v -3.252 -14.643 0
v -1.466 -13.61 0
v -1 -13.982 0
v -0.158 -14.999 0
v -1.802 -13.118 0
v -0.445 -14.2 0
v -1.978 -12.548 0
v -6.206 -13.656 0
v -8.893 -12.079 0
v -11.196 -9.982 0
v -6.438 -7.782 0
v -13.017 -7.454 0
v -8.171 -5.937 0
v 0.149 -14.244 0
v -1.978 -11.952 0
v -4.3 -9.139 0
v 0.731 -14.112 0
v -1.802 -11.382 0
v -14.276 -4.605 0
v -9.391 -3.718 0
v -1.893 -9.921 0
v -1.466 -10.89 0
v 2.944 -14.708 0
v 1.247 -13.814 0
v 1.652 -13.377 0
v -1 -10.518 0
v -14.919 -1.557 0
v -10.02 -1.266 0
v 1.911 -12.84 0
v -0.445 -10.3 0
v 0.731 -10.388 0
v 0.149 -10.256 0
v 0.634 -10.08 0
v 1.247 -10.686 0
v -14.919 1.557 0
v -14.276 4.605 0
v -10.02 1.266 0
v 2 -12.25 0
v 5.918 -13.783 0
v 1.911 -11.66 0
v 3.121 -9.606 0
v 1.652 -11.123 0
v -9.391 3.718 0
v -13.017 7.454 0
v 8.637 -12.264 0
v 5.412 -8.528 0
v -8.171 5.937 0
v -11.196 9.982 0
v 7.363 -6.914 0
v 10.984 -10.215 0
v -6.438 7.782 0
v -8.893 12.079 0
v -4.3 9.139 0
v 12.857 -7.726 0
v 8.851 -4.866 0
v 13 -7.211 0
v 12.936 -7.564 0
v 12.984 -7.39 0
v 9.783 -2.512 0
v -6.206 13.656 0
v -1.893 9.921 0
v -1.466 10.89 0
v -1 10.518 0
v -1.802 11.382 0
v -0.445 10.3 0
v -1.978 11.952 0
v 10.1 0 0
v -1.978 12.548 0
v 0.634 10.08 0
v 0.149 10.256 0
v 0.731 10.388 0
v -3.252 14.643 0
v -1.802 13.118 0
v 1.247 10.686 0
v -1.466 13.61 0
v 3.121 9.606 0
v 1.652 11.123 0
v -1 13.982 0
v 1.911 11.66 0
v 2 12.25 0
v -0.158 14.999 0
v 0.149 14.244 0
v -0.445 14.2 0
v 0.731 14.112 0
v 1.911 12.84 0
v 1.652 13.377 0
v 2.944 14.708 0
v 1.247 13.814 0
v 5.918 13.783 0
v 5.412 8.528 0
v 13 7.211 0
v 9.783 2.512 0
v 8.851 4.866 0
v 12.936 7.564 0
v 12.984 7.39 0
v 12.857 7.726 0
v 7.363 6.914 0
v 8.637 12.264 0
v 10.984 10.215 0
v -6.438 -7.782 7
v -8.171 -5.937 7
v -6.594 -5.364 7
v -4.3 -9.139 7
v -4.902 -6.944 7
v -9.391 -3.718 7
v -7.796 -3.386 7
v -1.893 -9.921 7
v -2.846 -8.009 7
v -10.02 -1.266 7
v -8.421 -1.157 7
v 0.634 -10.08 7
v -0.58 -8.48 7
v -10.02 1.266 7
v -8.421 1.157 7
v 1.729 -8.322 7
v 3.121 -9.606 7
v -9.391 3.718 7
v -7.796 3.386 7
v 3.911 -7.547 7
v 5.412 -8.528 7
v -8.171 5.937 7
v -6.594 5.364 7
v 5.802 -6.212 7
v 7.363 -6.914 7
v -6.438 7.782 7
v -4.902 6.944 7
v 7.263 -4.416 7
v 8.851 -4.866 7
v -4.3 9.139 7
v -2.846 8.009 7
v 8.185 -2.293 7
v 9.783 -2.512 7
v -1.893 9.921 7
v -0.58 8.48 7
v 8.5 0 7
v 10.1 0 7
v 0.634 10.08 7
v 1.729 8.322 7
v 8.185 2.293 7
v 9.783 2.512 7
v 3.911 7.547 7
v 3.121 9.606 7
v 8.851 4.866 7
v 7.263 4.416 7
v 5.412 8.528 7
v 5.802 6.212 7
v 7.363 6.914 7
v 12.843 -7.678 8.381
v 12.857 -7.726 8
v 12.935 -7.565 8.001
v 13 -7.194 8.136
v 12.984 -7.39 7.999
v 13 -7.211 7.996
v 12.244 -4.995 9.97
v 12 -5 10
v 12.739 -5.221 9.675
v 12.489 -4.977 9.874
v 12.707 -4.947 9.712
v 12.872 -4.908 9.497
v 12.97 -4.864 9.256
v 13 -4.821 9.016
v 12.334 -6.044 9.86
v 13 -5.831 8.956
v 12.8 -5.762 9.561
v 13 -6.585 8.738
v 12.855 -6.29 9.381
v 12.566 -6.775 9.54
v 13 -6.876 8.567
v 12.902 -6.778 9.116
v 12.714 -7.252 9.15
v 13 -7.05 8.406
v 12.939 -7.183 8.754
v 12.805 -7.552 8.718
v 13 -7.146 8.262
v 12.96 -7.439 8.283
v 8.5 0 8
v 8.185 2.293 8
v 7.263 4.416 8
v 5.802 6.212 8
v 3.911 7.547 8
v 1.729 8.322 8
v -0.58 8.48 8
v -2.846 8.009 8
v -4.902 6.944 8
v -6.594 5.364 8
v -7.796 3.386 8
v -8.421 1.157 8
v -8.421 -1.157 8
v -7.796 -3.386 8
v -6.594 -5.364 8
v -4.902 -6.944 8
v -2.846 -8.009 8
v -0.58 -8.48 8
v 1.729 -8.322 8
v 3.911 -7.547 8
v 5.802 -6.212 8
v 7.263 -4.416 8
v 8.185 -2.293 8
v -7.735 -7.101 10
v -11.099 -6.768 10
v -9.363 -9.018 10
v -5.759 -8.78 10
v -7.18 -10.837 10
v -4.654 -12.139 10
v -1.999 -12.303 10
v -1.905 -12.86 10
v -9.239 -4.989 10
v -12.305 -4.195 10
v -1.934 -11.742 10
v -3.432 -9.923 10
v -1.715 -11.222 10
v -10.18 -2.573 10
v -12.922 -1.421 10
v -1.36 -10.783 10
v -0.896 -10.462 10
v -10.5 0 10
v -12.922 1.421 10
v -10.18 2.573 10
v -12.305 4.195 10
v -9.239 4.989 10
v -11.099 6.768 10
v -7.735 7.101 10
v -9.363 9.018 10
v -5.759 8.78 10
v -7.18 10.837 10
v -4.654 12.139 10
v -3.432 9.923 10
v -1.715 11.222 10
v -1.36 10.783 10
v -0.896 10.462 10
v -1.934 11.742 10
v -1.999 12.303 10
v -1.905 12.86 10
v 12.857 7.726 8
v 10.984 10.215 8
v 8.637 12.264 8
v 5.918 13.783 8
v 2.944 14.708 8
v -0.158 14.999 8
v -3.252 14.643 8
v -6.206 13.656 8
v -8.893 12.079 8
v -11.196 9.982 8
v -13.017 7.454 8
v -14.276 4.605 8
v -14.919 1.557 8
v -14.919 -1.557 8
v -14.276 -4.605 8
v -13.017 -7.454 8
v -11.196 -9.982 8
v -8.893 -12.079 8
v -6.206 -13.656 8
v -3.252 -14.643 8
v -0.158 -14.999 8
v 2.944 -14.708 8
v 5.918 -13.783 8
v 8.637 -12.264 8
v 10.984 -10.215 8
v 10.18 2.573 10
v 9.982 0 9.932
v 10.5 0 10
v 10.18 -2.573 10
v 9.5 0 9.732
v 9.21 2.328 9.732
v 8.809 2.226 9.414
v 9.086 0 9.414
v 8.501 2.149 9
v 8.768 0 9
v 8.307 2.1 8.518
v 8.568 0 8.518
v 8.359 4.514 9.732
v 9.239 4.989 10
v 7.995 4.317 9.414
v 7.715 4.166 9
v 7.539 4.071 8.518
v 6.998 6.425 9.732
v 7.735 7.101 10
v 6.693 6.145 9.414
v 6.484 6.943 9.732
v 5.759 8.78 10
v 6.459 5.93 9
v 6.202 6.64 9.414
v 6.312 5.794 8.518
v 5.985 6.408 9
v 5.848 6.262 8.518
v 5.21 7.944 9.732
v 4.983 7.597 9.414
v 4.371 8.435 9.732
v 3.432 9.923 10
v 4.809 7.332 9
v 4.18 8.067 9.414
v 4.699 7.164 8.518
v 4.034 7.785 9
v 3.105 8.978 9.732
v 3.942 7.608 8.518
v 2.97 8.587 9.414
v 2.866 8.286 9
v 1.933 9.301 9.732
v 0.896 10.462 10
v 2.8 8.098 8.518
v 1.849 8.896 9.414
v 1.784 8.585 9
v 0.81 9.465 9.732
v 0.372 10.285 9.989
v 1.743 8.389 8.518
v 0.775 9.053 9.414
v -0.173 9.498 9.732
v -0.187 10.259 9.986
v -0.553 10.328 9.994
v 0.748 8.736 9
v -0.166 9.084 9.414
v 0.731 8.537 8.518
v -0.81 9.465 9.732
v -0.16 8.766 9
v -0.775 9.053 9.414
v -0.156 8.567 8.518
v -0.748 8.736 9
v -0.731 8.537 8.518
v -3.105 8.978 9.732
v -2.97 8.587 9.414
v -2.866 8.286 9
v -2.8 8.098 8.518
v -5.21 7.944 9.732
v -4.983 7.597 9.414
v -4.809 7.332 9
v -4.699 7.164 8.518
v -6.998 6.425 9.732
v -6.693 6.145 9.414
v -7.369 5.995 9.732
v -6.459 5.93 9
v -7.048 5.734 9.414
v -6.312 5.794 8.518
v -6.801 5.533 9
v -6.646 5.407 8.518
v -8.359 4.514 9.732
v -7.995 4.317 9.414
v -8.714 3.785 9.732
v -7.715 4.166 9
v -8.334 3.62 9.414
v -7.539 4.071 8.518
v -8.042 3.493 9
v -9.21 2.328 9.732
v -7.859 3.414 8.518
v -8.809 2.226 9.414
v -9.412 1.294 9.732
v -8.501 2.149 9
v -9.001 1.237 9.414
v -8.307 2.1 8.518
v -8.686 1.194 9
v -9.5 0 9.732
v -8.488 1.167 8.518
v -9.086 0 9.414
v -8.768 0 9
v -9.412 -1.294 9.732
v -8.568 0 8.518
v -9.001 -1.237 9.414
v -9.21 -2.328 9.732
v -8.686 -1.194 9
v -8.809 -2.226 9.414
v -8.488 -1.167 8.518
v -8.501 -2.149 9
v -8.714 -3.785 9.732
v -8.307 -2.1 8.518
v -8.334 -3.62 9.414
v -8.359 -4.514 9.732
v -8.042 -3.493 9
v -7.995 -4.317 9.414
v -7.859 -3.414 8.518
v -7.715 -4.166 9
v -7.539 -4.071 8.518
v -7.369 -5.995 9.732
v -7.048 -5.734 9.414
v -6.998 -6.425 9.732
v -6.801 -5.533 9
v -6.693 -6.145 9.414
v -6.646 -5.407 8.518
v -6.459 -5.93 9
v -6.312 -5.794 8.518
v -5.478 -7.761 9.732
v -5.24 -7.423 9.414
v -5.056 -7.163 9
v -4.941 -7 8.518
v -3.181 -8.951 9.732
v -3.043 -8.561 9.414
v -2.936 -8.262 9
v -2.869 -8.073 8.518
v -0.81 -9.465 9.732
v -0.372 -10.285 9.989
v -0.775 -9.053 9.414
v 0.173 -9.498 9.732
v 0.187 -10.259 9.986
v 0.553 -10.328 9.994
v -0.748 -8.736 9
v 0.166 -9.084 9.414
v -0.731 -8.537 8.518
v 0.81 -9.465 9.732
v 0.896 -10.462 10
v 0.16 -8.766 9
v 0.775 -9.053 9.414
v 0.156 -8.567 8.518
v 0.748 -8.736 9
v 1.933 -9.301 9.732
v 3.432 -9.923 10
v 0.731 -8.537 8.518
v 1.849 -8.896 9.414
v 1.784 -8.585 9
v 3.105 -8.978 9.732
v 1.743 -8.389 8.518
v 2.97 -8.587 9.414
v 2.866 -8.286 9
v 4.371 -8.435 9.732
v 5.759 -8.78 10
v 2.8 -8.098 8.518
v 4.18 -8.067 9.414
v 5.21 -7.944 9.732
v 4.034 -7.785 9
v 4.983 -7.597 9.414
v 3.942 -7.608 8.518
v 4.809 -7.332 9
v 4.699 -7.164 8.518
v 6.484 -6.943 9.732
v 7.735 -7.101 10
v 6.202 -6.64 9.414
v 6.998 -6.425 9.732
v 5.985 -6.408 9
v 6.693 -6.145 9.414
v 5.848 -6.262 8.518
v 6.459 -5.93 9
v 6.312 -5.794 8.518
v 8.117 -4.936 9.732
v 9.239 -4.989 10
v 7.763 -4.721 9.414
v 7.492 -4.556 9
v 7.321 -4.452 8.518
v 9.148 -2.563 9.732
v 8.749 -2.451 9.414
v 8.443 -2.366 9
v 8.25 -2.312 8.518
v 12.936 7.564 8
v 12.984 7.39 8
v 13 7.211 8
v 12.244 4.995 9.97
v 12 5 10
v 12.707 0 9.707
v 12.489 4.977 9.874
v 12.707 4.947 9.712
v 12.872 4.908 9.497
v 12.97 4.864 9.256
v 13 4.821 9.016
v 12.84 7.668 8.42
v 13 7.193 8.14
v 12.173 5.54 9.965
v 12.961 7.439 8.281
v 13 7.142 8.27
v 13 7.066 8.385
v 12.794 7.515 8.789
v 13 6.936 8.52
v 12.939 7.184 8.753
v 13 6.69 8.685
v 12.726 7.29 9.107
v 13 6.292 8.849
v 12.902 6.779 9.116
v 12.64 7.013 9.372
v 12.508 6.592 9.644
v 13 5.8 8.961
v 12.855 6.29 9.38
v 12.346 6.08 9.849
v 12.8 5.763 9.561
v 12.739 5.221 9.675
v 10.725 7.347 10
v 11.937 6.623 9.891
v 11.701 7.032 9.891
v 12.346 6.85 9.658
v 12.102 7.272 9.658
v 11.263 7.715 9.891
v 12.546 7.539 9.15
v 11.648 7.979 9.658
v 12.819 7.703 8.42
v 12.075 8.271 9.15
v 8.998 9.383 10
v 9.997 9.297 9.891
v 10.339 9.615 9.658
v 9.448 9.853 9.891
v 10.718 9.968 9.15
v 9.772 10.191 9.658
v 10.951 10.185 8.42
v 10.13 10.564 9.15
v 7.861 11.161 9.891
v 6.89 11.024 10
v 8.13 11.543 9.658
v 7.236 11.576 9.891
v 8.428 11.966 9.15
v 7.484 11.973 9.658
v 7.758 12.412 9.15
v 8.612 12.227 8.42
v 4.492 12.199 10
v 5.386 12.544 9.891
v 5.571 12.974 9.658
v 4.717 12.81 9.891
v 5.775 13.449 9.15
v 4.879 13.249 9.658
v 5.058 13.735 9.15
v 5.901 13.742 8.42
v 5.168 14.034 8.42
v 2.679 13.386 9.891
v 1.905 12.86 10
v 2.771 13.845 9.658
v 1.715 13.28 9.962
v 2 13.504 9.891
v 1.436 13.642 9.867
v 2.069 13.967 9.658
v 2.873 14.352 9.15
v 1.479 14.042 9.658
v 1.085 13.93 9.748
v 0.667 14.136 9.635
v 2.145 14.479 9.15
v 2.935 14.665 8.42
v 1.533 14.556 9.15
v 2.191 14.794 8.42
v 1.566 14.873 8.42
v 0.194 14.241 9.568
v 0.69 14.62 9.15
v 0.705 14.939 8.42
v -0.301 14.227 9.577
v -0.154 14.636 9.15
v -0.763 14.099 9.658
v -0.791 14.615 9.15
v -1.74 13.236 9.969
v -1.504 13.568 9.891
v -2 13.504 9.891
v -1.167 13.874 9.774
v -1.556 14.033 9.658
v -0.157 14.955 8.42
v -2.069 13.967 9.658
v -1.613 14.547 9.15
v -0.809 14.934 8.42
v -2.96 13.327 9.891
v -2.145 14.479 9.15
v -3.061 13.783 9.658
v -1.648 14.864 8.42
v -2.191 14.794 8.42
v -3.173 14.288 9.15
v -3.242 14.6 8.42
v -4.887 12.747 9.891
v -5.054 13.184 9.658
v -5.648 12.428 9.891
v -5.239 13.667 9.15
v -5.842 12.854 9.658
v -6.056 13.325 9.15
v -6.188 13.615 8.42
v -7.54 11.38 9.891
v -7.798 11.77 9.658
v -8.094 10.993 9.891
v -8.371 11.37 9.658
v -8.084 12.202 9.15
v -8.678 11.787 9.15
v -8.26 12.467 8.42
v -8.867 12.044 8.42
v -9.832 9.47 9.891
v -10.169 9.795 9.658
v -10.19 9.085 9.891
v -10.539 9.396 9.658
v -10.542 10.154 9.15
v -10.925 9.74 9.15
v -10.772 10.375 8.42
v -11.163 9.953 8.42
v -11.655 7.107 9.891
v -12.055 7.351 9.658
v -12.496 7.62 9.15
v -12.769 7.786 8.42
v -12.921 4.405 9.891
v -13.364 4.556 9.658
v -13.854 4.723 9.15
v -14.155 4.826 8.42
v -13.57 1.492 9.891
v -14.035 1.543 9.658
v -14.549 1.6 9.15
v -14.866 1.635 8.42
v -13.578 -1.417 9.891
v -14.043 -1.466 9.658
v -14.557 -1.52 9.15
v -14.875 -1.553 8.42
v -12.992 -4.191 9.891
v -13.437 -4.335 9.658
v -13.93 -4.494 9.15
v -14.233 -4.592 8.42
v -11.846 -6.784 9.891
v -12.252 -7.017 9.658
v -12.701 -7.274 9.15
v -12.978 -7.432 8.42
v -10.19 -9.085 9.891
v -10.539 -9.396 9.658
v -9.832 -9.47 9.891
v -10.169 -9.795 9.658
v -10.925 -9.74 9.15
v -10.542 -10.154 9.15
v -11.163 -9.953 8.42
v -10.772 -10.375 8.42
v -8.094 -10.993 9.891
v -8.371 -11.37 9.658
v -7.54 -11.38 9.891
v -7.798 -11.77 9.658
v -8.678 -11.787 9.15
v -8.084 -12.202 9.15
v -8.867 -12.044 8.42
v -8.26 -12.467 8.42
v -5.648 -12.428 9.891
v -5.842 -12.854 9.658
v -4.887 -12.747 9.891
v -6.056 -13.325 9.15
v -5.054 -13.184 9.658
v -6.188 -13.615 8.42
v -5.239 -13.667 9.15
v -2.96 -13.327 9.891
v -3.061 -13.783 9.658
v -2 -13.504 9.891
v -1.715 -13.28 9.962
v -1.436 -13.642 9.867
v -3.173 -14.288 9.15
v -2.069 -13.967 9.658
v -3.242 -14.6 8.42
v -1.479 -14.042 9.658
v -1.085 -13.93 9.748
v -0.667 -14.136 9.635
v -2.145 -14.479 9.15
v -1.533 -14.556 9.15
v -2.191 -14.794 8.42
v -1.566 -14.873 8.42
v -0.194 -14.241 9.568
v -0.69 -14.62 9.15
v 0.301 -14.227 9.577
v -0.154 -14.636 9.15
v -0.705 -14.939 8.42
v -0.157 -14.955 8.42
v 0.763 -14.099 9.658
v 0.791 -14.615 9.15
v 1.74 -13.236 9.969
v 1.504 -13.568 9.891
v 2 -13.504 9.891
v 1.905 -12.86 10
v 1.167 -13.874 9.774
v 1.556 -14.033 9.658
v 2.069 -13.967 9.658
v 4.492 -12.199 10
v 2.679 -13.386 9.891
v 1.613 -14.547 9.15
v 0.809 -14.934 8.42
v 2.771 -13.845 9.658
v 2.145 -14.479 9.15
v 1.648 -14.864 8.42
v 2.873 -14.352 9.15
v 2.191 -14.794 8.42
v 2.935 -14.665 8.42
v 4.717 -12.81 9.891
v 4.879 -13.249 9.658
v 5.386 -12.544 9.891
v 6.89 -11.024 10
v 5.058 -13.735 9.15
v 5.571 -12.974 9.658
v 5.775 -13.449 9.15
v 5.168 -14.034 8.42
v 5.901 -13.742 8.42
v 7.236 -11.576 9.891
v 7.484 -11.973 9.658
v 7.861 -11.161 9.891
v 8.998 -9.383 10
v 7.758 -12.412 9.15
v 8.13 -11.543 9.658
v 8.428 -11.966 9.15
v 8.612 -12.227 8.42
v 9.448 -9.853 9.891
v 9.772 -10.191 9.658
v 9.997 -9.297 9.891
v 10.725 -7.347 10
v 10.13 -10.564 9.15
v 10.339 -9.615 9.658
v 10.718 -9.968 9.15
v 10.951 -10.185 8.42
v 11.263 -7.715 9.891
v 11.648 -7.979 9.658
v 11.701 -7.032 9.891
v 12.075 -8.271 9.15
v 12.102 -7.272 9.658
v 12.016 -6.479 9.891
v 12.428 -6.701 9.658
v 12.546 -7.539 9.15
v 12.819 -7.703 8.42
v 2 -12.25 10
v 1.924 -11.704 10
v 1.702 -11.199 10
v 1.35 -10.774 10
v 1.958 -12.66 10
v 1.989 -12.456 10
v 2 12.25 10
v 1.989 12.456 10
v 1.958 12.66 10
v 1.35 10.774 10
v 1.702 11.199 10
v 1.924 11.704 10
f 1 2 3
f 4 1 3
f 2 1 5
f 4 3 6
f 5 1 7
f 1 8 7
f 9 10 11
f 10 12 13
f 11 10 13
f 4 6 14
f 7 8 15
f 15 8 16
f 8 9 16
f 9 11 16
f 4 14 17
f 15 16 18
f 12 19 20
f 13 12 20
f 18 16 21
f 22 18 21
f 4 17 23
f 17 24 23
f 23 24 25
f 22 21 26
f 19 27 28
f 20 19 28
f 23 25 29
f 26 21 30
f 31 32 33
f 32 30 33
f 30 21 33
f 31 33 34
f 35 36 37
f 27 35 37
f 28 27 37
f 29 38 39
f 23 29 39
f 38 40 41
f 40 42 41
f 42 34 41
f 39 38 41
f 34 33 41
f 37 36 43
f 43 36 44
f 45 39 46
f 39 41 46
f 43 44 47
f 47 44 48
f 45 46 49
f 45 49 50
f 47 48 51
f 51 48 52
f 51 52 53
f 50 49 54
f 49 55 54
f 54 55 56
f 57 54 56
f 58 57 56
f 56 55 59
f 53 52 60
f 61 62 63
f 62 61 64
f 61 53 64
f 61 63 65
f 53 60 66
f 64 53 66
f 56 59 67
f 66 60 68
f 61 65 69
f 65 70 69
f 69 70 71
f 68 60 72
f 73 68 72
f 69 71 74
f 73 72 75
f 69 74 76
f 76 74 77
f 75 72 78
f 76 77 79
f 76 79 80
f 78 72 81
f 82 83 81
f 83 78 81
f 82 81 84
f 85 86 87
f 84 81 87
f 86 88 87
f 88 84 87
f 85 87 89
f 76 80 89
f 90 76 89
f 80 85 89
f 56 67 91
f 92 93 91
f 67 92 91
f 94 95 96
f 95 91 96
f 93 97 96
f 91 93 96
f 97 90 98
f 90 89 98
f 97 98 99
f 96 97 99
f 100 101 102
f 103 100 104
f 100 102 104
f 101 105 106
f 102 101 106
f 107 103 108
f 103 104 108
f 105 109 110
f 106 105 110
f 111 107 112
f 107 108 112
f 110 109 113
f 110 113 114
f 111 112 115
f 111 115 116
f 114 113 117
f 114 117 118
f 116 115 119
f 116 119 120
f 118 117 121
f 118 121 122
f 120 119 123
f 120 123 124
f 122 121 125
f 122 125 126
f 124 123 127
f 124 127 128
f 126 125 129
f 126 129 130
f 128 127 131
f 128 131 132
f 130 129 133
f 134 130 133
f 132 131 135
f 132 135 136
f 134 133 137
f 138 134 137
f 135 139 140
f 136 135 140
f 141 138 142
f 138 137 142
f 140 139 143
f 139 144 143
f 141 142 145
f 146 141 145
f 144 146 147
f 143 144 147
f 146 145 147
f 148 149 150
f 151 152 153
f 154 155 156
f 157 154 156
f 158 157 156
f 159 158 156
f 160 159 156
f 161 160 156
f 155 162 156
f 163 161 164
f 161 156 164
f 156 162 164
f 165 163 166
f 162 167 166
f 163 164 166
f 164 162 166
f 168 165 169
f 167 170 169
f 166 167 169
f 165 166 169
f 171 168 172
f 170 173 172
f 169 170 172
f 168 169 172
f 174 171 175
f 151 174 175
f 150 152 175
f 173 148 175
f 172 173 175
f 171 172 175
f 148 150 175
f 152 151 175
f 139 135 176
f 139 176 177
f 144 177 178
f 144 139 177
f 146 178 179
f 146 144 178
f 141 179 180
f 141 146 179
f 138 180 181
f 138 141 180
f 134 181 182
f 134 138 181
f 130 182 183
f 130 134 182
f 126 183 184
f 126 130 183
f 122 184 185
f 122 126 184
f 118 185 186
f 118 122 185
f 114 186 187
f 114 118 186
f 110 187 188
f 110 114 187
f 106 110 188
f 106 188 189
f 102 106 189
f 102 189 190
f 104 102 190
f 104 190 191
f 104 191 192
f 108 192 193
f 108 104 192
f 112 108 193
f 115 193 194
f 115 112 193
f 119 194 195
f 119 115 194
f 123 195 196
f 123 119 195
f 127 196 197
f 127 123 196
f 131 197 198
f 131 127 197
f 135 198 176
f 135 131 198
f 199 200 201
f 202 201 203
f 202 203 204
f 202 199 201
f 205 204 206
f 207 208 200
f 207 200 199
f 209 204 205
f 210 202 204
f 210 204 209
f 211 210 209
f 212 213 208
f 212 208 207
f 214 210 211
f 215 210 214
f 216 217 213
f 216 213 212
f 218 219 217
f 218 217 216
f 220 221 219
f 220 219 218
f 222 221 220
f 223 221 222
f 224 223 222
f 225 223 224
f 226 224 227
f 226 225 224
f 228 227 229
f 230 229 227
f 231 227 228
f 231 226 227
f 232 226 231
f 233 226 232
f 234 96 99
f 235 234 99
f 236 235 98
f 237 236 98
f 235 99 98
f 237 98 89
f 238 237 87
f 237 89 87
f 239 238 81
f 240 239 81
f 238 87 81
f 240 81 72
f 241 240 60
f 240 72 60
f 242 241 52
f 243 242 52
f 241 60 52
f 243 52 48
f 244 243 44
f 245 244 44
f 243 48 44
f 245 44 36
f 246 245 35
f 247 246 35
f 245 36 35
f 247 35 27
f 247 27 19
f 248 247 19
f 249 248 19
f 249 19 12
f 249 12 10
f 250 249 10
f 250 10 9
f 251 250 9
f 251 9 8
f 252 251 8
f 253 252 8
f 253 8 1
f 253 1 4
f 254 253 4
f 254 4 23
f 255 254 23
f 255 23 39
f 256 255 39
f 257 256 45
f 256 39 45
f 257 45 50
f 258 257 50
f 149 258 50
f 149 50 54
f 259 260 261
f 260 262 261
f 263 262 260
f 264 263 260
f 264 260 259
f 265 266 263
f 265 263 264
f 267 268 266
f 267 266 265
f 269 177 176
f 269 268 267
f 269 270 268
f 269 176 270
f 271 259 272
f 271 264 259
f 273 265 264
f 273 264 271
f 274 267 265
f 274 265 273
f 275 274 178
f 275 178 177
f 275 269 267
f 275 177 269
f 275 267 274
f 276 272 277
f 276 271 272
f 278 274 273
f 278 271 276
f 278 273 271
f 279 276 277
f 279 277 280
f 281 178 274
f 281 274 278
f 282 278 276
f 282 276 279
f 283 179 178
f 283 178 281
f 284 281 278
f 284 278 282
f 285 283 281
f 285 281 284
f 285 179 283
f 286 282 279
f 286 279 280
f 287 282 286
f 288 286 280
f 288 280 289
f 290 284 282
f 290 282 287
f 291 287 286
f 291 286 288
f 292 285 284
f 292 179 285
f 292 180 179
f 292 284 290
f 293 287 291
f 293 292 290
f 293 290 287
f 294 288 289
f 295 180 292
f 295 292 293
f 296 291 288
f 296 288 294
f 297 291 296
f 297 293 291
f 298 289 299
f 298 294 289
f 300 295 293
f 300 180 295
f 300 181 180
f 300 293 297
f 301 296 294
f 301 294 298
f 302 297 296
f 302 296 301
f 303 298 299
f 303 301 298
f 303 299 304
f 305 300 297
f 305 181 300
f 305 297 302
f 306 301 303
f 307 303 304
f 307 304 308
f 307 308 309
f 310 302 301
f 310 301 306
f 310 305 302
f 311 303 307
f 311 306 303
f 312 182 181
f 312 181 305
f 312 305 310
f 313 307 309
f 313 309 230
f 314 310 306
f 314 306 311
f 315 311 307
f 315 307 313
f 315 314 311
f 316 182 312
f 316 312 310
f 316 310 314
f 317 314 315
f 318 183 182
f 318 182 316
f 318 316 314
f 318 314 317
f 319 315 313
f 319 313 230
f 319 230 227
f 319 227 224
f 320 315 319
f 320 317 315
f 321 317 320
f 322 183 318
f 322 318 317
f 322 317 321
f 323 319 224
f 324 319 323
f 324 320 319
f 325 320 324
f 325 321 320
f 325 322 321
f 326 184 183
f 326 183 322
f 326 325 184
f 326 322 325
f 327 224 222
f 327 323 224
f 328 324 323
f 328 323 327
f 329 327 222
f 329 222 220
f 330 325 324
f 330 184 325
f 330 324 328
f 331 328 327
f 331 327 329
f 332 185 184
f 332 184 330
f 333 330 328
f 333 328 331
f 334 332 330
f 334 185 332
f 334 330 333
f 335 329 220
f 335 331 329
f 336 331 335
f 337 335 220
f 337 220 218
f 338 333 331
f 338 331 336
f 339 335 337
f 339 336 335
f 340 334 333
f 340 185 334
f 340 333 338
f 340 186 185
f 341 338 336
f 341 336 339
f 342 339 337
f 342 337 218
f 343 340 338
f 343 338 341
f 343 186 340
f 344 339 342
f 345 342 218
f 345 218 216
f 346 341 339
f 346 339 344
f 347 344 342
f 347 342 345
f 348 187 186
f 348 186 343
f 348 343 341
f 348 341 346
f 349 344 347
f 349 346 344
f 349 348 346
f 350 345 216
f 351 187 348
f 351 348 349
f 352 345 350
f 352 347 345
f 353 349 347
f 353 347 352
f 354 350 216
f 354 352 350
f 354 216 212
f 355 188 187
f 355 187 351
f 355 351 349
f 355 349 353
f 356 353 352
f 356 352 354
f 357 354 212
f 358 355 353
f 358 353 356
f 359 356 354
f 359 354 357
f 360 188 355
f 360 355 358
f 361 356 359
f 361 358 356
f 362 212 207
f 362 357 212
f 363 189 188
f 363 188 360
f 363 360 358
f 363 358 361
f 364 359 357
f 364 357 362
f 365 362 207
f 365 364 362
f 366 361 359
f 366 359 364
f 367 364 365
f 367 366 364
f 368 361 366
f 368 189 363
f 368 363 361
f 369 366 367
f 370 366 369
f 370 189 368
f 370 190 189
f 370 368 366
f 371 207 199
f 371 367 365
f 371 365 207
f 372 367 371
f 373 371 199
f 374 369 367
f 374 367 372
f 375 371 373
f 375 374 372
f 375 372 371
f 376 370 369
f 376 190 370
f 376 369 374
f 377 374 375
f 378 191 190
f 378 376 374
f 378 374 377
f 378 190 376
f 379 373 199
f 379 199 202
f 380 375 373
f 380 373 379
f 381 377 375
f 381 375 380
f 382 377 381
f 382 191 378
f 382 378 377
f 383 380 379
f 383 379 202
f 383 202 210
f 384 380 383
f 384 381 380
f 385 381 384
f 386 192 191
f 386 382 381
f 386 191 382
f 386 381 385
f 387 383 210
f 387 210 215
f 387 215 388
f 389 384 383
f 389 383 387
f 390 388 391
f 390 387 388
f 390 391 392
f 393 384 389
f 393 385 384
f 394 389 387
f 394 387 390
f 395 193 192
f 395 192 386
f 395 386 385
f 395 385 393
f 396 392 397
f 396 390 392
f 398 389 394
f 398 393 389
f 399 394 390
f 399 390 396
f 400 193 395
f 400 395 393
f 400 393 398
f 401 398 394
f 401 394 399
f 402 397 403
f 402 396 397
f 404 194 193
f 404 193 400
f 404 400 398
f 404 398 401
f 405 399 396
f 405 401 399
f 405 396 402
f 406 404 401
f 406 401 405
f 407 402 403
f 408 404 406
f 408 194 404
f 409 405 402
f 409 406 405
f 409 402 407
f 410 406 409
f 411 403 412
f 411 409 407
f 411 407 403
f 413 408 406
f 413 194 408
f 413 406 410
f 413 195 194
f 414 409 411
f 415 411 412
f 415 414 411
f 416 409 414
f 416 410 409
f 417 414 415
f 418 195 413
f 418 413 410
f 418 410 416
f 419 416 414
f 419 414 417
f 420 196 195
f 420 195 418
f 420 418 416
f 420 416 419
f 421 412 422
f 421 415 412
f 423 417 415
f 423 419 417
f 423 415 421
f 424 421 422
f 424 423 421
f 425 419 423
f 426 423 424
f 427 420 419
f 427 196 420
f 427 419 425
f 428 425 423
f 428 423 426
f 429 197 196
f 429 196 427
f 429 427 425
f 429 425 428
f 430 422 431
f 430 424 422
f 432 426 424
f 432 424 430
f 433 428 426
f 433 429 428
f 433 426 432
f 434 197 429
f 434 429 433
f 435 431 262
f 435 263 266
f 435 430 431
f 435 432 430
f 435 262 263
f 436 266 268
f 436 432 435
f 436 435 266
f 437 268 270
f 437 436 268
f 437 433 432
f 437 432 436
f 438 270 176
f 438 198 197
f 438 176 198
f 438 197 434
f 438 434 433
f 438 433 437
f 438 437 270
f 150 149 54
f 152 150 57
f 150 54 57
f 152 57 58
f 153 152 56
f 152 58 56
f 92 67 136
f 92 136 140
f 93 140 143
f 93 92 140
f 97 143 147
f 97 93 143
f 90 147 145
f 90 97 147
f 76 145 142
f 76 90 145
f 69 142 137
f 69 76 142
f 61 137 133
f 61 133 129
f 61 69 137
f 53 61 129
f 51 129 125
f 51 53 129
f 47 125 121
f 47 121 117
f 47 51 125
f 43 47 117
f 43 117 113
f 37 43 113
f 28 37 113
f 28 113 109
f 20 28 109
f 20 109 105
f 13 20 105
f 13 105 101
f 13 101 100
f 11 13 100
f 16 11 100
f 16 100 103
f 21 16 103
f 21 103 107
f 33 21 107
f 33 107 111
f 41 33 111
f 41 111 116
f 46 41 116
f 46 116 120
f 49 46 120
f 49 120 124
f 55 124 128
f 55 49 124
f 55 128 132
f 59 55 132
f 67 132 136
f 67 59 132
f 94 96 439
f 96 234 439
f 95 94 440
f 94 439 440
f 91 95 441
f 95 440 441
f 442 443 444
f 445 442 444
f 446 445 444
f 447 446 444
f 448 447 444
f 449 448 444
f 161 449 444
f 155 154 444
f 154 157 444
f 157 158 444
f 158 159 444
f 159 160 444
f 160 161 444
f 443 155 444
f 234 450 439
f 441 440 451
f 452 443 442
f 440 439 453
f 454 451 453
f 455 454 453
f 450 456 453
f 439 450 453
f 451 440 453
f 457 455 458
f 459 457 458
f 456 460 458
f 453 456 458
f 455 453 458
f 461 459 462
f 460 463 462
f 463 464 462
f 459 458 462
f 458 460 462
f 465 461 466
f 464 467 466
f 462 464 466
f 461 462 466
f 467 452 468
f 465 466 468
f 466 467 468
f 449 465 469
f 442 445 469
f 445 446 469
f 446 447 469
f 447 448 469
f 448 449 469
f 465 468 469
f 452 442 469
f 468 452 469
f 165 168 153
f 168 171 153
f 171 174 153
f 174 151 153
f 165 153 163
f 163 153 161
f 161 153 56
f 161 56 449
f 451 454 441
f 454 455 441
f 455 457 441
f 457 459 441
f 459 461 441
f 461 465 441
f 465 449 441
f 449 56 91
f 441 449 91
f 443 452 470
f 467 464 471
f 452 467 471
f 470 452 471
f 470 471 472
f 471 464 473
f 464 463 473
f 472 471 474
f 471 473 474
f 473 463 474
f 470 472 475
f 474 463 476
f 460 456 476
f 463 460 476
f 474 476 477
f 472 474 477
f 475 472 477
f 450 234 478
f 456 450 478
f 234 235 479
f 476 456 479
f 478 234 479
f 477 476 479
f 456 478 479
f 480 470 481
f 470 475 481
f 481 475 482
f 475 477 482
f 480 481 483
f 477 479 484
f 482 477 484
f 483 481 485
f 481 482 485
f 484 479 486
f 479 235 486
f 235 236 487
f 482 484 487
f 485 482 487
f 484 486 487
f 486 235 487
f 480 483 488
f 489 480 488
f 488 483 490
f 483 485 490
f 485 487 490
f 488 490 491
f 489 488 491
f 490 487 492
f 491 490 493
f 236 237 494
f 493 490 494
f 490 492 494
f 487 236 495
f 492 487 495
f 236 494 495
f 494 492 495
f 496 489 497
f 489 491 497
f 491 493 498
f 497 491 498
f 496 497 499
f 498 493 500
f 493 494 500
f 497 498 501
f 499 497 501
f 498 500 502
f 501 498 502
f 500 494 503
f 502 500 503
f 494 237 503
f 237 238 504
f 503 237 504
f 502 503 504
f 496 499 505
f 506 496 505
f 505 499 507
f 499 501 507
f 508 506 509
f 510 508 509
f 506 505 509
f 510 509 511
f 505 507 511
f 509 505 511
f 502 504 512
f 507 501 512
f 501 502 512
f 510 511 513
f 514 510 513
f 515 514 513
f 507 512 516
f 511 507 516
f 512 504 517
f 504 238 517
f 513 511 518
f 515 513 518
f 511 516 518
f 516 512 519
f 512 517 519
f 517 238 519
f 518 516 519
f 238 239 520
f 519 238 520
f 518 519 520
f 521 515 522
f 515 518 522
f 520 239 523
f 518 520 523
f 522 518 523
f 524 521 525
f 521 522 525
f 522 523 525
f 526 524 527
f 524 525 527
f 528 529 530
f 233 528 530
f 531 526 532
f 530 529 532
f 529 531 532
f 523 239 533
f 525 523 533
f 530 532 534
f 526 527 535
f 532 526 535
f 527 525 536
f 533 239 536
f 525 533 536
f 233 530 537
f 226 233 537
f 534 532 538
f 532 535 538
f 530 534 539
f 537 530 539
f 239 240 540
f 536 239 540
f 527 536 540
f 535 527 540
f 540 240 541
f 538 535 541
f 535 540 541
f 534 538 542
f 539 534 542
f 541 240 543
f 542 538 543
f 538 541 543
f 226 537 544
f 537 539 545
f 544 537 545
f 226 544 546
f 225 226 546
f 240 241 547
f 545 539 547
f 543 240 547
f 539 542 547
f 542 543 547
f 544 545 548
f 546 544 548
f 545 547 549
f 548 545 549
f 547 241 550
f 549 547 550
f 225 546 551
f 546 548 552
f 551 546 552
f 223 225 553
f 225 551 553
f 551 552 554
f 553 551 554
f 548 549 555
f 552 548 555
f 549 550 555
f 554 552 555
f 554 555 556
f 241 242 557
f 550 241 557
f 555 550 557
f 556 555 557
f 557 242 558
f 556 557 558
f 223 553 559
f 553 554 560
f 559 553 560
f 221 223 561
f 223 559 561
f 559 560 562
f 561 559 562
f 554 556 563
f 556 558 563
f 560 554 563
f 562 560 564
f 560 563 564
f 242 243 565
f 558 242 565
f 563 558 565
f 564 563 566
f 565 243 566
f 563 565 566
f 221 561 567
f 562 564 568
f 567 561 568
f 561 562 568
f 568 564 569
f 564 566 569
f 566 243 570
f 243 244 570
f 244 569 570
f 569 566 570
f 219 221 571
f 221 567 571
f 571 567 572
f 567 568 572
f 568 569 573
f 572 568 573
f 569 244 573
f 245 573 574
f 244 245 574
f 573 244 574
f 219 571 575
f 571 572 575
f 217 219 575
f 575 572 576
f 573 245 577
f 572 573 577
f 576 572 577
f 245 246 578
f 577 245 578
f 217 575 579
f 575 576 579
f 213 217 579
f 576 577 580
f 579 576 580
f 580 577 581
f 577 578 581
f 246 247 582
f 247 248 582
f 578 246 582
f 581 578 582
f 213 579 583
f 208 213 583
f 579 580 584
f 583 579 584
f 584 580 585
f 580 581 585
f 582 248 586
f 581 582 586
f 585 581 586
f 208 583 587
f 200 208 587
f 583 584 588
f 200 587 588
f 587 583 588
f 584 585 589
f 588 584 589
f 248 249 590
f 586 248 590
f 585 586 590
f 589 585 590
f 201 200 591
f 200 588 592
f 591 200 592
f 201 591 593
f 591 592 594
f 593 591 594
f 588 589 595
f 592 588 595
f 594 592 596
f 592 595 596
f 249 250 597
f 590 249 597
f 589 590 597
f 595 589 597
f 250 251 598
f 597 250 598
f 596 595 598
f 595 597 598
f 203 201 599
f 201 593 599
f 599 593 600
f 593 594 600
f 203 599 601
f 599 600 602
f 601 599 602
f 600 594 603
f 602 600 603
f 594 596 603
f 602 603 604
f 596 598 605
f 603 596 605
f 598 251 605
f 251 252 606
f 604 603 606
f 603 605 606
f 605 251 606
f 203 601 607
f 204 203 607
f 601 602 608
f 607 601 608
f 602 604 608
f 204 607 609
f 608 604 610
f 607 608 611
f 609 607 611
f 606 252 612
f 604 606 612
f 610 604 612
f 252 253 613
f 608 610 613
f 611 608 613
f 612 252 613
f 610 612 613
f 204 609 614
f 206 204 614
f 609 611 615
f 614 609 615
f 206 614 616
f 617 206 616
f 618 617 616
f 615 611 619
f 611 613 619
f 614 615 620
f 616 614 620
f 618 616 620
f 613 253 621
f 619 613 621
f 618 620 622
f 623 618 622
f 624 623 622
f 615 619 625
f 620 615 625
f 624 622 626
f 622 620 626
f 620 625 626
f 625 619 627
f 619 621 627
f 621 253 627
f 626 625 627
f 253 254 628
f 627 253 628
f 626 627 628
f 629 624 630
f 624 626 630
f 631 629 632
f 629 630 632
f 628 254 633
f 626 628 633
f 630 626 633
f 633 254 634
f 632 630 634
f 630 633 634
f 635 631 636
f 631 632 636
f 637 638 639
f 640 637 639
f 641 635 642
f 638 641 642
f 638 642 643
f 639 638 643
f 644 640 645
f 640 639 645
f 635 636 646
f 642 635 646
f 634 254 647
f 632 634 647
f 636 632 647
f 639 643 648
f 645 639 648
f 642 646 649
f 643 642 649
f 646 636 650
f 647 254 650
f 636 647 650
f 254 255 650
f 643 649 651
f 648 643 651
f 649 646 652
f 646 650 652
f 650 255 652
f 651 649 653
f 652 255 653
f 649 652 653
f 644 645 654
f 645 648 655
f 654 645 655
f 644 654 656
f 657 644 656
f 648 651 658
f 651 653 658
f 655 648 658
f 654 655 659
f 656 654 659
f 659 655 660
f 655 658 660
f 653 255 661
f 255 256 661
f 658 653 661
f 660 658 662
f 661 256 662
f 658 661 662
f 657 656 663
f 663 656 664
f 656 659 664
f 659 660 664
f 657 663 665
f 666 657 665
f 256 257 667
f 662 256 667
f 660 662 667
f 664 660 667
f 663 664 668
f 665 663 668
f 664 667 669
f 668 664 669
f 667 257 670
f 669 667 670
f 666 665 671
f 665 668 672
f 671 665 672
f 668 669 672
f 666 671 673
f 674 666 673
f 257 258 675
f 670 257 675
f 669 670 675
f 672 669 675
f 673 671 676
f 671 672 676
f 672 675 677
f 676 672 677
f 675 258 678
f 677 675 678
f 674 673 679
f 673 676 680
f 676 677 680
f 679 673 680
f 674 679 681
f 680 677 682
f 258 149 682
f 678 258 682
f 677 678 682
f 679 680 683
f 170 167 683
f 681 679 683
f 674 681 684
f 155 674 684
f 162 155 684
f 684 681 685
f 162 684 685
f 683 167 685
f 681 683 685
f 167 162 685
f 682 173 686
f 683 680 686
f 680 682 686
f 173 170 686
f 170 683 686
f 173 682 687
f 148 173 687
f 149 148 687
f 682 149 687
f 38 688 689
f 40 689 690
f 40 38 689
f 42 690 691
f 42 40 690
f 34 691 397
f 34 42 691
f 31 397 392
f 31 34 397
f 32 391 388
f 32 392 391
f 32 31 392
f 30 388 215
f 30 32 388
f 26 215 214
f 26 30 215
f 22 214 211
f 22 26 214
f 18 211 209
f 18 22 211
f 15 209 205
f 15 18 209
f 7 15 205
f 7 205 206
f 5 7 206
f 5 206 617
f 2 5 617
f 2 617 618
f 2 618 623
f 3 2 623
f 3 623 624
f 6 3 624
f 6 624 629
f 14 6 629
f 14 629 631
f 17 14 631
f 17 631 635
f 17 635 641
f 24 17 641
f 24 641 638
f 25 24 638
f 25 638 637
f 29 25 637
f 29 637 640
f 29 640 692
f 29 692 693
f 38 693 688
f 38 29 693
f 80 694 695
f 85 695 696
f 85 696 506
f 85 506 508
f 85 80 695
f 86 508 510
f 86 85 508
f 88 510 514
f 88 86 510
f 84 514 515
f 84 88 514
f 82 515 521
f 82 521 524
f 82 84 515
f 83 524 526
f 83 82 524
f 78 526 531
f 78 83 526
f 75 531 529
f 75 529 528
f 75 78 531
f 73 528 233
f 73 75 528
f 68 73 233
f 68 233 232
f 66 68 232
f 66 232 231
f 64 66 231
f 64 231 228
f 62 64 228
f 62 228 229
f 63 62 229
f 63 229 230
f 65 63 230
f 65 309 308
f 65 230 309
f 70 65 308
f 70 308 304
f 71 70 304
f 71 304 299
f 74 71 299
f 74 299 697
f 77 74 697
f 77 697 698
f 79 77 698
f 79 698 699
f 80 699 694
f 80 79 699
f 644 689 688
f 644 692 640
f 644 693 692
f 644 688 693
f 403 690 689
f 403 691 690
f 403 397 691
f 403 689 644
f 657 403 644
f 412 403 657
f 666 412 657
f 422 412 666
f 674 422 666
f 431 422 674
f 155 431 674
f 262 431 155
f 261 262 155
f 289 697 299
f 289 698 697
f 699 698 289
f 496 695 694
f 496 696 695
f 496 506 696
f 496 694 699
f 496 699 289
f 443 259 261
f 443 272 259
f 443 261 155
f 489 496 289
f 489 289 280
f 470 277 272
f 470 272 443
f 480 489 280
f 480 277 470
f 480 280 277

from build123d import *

# Parameters (mm, degrees)
CYLINDER009_R     = 2
CYLINDER009_DEPTH = 10
CYLINDER010_R     = 2
CYLINDER010_DEPTH = 10
BOX_W             = 4
BOX_H             = 20
BOX_DEPTH         = 10
CYLINDER004_R     = 8.5
CYLINDER004_DEPTH = 3
CYLINDER005_R     = 10.1
CYLINDER005_DEPTH = 10
CYLINDER002_R     = 15
CYLINDER002_DEPTH = 10
FILLET_R          = 2
FILLET001_R       = 2
FILLET004_R       = 1


with BuildPart() as cylinder009:
    # Cylinder009 → Cylinder009 (new body)
    with BuildSketch(Plane(origin=(0, -12.25, 0), x_dir=(1, 0, 0), z_dir=(0, 0, 1))):
        Circle(CYLINDER009_R)
    extrude(amount=CYLINDER009_DEPTH)


with BuildPart() as fusion003:
    # Cylinder010 → Cylinder010 (new body)
    with BuildSketch(Plane(origin=(0, 12.25, 0), x_dir=(1, 0, 0), z_dir=(0, 0, 1))):
        Circle(CYLINDER010_R)
    extrude(amount=CYLINDER010_DEPTH)

    # Fusion003: union Cylinder009
    add(cylinder009.part)


with BuildPart() as cube:
    # Box → Box (new body)
    with BuildSketch(Plane(origin=(13, -10, 0), x_dir=(1, 0, 0), z_dir=(0, 0, 1))):
        with Locations((2, 10)):
            Rectangle(BOX_W, BOX_H)
    extrude(amount=BOX_DEPTH)


with BuildPart() as cylinder004:
    # Cylinder004 → Cylinder004 (new body)
    with BuildSketch(Plane.XY):
        Circle(CYLINDER004_R)
    extrude(amount=CYLINDER004_DEPTH)


with BuildPart() as fusion001:
    # Cylinder005 → Cylinder005 (new body)
    with BuildSketch(Plane.XY.offset(-10)):
        Circle(CYLINDER005_R)
    extrude(amount=CYLINDER005_DEPTH)

    # Fusion001: union Cylinder004
    add(cylinder004.part)


with BuildPart() as fusion001_1:
    # Fusion001 placement: moved
    add(fusion001.part.moved(Location((0, 0, 7))))


with BuildPart() as hylsa002:
    # Cylinder002 → Cylinder002 (new body)
    with BuildSketch(Plane.XY):
        Circle(CYLINDER002_R)
    extrude(amount=CYLINDER002_DEPTH)

    # Cut: cut Fusion001
    add(fusion001_1.part, mode=Mode.SUBTRACT)

    # Fillet
    fillet_edges = [hylsa002.edges().sort_by_distance(p)[0] for p in [
        (-8.5, 0, 10),
    ]]
    fillet(fillet_edges, radius=FILLET_R)

    # Fillet001
    fillet001_edges = [hylsa002.edges().sort_by_distance(p)[0] for p in [
        (-15, 0, 10),
    ]]
    fillet(fillet001_edges, radius=FILLET001_R)

    # Cut002: cut Cube
    add(cube.part, mode=Mode.SUBTRACT)

    # Fillet004
    fillet004_edges = [hylsa002.edges().sort_by_distance(p)[0] for p in [
        (13, 4.143485, 9.893358),
        (13, -4.143485, 9.893358),
        (13, 7.483315, 4),
        (13, -7.483315, 4),
    ]]
    fillet(fillet004_edges, radius=FILLET004_R)

    # Cut005: cut Fusion003
    add(fusion003.part, mode=Mode.SUBTRACT)


solid = hylsa002.part
